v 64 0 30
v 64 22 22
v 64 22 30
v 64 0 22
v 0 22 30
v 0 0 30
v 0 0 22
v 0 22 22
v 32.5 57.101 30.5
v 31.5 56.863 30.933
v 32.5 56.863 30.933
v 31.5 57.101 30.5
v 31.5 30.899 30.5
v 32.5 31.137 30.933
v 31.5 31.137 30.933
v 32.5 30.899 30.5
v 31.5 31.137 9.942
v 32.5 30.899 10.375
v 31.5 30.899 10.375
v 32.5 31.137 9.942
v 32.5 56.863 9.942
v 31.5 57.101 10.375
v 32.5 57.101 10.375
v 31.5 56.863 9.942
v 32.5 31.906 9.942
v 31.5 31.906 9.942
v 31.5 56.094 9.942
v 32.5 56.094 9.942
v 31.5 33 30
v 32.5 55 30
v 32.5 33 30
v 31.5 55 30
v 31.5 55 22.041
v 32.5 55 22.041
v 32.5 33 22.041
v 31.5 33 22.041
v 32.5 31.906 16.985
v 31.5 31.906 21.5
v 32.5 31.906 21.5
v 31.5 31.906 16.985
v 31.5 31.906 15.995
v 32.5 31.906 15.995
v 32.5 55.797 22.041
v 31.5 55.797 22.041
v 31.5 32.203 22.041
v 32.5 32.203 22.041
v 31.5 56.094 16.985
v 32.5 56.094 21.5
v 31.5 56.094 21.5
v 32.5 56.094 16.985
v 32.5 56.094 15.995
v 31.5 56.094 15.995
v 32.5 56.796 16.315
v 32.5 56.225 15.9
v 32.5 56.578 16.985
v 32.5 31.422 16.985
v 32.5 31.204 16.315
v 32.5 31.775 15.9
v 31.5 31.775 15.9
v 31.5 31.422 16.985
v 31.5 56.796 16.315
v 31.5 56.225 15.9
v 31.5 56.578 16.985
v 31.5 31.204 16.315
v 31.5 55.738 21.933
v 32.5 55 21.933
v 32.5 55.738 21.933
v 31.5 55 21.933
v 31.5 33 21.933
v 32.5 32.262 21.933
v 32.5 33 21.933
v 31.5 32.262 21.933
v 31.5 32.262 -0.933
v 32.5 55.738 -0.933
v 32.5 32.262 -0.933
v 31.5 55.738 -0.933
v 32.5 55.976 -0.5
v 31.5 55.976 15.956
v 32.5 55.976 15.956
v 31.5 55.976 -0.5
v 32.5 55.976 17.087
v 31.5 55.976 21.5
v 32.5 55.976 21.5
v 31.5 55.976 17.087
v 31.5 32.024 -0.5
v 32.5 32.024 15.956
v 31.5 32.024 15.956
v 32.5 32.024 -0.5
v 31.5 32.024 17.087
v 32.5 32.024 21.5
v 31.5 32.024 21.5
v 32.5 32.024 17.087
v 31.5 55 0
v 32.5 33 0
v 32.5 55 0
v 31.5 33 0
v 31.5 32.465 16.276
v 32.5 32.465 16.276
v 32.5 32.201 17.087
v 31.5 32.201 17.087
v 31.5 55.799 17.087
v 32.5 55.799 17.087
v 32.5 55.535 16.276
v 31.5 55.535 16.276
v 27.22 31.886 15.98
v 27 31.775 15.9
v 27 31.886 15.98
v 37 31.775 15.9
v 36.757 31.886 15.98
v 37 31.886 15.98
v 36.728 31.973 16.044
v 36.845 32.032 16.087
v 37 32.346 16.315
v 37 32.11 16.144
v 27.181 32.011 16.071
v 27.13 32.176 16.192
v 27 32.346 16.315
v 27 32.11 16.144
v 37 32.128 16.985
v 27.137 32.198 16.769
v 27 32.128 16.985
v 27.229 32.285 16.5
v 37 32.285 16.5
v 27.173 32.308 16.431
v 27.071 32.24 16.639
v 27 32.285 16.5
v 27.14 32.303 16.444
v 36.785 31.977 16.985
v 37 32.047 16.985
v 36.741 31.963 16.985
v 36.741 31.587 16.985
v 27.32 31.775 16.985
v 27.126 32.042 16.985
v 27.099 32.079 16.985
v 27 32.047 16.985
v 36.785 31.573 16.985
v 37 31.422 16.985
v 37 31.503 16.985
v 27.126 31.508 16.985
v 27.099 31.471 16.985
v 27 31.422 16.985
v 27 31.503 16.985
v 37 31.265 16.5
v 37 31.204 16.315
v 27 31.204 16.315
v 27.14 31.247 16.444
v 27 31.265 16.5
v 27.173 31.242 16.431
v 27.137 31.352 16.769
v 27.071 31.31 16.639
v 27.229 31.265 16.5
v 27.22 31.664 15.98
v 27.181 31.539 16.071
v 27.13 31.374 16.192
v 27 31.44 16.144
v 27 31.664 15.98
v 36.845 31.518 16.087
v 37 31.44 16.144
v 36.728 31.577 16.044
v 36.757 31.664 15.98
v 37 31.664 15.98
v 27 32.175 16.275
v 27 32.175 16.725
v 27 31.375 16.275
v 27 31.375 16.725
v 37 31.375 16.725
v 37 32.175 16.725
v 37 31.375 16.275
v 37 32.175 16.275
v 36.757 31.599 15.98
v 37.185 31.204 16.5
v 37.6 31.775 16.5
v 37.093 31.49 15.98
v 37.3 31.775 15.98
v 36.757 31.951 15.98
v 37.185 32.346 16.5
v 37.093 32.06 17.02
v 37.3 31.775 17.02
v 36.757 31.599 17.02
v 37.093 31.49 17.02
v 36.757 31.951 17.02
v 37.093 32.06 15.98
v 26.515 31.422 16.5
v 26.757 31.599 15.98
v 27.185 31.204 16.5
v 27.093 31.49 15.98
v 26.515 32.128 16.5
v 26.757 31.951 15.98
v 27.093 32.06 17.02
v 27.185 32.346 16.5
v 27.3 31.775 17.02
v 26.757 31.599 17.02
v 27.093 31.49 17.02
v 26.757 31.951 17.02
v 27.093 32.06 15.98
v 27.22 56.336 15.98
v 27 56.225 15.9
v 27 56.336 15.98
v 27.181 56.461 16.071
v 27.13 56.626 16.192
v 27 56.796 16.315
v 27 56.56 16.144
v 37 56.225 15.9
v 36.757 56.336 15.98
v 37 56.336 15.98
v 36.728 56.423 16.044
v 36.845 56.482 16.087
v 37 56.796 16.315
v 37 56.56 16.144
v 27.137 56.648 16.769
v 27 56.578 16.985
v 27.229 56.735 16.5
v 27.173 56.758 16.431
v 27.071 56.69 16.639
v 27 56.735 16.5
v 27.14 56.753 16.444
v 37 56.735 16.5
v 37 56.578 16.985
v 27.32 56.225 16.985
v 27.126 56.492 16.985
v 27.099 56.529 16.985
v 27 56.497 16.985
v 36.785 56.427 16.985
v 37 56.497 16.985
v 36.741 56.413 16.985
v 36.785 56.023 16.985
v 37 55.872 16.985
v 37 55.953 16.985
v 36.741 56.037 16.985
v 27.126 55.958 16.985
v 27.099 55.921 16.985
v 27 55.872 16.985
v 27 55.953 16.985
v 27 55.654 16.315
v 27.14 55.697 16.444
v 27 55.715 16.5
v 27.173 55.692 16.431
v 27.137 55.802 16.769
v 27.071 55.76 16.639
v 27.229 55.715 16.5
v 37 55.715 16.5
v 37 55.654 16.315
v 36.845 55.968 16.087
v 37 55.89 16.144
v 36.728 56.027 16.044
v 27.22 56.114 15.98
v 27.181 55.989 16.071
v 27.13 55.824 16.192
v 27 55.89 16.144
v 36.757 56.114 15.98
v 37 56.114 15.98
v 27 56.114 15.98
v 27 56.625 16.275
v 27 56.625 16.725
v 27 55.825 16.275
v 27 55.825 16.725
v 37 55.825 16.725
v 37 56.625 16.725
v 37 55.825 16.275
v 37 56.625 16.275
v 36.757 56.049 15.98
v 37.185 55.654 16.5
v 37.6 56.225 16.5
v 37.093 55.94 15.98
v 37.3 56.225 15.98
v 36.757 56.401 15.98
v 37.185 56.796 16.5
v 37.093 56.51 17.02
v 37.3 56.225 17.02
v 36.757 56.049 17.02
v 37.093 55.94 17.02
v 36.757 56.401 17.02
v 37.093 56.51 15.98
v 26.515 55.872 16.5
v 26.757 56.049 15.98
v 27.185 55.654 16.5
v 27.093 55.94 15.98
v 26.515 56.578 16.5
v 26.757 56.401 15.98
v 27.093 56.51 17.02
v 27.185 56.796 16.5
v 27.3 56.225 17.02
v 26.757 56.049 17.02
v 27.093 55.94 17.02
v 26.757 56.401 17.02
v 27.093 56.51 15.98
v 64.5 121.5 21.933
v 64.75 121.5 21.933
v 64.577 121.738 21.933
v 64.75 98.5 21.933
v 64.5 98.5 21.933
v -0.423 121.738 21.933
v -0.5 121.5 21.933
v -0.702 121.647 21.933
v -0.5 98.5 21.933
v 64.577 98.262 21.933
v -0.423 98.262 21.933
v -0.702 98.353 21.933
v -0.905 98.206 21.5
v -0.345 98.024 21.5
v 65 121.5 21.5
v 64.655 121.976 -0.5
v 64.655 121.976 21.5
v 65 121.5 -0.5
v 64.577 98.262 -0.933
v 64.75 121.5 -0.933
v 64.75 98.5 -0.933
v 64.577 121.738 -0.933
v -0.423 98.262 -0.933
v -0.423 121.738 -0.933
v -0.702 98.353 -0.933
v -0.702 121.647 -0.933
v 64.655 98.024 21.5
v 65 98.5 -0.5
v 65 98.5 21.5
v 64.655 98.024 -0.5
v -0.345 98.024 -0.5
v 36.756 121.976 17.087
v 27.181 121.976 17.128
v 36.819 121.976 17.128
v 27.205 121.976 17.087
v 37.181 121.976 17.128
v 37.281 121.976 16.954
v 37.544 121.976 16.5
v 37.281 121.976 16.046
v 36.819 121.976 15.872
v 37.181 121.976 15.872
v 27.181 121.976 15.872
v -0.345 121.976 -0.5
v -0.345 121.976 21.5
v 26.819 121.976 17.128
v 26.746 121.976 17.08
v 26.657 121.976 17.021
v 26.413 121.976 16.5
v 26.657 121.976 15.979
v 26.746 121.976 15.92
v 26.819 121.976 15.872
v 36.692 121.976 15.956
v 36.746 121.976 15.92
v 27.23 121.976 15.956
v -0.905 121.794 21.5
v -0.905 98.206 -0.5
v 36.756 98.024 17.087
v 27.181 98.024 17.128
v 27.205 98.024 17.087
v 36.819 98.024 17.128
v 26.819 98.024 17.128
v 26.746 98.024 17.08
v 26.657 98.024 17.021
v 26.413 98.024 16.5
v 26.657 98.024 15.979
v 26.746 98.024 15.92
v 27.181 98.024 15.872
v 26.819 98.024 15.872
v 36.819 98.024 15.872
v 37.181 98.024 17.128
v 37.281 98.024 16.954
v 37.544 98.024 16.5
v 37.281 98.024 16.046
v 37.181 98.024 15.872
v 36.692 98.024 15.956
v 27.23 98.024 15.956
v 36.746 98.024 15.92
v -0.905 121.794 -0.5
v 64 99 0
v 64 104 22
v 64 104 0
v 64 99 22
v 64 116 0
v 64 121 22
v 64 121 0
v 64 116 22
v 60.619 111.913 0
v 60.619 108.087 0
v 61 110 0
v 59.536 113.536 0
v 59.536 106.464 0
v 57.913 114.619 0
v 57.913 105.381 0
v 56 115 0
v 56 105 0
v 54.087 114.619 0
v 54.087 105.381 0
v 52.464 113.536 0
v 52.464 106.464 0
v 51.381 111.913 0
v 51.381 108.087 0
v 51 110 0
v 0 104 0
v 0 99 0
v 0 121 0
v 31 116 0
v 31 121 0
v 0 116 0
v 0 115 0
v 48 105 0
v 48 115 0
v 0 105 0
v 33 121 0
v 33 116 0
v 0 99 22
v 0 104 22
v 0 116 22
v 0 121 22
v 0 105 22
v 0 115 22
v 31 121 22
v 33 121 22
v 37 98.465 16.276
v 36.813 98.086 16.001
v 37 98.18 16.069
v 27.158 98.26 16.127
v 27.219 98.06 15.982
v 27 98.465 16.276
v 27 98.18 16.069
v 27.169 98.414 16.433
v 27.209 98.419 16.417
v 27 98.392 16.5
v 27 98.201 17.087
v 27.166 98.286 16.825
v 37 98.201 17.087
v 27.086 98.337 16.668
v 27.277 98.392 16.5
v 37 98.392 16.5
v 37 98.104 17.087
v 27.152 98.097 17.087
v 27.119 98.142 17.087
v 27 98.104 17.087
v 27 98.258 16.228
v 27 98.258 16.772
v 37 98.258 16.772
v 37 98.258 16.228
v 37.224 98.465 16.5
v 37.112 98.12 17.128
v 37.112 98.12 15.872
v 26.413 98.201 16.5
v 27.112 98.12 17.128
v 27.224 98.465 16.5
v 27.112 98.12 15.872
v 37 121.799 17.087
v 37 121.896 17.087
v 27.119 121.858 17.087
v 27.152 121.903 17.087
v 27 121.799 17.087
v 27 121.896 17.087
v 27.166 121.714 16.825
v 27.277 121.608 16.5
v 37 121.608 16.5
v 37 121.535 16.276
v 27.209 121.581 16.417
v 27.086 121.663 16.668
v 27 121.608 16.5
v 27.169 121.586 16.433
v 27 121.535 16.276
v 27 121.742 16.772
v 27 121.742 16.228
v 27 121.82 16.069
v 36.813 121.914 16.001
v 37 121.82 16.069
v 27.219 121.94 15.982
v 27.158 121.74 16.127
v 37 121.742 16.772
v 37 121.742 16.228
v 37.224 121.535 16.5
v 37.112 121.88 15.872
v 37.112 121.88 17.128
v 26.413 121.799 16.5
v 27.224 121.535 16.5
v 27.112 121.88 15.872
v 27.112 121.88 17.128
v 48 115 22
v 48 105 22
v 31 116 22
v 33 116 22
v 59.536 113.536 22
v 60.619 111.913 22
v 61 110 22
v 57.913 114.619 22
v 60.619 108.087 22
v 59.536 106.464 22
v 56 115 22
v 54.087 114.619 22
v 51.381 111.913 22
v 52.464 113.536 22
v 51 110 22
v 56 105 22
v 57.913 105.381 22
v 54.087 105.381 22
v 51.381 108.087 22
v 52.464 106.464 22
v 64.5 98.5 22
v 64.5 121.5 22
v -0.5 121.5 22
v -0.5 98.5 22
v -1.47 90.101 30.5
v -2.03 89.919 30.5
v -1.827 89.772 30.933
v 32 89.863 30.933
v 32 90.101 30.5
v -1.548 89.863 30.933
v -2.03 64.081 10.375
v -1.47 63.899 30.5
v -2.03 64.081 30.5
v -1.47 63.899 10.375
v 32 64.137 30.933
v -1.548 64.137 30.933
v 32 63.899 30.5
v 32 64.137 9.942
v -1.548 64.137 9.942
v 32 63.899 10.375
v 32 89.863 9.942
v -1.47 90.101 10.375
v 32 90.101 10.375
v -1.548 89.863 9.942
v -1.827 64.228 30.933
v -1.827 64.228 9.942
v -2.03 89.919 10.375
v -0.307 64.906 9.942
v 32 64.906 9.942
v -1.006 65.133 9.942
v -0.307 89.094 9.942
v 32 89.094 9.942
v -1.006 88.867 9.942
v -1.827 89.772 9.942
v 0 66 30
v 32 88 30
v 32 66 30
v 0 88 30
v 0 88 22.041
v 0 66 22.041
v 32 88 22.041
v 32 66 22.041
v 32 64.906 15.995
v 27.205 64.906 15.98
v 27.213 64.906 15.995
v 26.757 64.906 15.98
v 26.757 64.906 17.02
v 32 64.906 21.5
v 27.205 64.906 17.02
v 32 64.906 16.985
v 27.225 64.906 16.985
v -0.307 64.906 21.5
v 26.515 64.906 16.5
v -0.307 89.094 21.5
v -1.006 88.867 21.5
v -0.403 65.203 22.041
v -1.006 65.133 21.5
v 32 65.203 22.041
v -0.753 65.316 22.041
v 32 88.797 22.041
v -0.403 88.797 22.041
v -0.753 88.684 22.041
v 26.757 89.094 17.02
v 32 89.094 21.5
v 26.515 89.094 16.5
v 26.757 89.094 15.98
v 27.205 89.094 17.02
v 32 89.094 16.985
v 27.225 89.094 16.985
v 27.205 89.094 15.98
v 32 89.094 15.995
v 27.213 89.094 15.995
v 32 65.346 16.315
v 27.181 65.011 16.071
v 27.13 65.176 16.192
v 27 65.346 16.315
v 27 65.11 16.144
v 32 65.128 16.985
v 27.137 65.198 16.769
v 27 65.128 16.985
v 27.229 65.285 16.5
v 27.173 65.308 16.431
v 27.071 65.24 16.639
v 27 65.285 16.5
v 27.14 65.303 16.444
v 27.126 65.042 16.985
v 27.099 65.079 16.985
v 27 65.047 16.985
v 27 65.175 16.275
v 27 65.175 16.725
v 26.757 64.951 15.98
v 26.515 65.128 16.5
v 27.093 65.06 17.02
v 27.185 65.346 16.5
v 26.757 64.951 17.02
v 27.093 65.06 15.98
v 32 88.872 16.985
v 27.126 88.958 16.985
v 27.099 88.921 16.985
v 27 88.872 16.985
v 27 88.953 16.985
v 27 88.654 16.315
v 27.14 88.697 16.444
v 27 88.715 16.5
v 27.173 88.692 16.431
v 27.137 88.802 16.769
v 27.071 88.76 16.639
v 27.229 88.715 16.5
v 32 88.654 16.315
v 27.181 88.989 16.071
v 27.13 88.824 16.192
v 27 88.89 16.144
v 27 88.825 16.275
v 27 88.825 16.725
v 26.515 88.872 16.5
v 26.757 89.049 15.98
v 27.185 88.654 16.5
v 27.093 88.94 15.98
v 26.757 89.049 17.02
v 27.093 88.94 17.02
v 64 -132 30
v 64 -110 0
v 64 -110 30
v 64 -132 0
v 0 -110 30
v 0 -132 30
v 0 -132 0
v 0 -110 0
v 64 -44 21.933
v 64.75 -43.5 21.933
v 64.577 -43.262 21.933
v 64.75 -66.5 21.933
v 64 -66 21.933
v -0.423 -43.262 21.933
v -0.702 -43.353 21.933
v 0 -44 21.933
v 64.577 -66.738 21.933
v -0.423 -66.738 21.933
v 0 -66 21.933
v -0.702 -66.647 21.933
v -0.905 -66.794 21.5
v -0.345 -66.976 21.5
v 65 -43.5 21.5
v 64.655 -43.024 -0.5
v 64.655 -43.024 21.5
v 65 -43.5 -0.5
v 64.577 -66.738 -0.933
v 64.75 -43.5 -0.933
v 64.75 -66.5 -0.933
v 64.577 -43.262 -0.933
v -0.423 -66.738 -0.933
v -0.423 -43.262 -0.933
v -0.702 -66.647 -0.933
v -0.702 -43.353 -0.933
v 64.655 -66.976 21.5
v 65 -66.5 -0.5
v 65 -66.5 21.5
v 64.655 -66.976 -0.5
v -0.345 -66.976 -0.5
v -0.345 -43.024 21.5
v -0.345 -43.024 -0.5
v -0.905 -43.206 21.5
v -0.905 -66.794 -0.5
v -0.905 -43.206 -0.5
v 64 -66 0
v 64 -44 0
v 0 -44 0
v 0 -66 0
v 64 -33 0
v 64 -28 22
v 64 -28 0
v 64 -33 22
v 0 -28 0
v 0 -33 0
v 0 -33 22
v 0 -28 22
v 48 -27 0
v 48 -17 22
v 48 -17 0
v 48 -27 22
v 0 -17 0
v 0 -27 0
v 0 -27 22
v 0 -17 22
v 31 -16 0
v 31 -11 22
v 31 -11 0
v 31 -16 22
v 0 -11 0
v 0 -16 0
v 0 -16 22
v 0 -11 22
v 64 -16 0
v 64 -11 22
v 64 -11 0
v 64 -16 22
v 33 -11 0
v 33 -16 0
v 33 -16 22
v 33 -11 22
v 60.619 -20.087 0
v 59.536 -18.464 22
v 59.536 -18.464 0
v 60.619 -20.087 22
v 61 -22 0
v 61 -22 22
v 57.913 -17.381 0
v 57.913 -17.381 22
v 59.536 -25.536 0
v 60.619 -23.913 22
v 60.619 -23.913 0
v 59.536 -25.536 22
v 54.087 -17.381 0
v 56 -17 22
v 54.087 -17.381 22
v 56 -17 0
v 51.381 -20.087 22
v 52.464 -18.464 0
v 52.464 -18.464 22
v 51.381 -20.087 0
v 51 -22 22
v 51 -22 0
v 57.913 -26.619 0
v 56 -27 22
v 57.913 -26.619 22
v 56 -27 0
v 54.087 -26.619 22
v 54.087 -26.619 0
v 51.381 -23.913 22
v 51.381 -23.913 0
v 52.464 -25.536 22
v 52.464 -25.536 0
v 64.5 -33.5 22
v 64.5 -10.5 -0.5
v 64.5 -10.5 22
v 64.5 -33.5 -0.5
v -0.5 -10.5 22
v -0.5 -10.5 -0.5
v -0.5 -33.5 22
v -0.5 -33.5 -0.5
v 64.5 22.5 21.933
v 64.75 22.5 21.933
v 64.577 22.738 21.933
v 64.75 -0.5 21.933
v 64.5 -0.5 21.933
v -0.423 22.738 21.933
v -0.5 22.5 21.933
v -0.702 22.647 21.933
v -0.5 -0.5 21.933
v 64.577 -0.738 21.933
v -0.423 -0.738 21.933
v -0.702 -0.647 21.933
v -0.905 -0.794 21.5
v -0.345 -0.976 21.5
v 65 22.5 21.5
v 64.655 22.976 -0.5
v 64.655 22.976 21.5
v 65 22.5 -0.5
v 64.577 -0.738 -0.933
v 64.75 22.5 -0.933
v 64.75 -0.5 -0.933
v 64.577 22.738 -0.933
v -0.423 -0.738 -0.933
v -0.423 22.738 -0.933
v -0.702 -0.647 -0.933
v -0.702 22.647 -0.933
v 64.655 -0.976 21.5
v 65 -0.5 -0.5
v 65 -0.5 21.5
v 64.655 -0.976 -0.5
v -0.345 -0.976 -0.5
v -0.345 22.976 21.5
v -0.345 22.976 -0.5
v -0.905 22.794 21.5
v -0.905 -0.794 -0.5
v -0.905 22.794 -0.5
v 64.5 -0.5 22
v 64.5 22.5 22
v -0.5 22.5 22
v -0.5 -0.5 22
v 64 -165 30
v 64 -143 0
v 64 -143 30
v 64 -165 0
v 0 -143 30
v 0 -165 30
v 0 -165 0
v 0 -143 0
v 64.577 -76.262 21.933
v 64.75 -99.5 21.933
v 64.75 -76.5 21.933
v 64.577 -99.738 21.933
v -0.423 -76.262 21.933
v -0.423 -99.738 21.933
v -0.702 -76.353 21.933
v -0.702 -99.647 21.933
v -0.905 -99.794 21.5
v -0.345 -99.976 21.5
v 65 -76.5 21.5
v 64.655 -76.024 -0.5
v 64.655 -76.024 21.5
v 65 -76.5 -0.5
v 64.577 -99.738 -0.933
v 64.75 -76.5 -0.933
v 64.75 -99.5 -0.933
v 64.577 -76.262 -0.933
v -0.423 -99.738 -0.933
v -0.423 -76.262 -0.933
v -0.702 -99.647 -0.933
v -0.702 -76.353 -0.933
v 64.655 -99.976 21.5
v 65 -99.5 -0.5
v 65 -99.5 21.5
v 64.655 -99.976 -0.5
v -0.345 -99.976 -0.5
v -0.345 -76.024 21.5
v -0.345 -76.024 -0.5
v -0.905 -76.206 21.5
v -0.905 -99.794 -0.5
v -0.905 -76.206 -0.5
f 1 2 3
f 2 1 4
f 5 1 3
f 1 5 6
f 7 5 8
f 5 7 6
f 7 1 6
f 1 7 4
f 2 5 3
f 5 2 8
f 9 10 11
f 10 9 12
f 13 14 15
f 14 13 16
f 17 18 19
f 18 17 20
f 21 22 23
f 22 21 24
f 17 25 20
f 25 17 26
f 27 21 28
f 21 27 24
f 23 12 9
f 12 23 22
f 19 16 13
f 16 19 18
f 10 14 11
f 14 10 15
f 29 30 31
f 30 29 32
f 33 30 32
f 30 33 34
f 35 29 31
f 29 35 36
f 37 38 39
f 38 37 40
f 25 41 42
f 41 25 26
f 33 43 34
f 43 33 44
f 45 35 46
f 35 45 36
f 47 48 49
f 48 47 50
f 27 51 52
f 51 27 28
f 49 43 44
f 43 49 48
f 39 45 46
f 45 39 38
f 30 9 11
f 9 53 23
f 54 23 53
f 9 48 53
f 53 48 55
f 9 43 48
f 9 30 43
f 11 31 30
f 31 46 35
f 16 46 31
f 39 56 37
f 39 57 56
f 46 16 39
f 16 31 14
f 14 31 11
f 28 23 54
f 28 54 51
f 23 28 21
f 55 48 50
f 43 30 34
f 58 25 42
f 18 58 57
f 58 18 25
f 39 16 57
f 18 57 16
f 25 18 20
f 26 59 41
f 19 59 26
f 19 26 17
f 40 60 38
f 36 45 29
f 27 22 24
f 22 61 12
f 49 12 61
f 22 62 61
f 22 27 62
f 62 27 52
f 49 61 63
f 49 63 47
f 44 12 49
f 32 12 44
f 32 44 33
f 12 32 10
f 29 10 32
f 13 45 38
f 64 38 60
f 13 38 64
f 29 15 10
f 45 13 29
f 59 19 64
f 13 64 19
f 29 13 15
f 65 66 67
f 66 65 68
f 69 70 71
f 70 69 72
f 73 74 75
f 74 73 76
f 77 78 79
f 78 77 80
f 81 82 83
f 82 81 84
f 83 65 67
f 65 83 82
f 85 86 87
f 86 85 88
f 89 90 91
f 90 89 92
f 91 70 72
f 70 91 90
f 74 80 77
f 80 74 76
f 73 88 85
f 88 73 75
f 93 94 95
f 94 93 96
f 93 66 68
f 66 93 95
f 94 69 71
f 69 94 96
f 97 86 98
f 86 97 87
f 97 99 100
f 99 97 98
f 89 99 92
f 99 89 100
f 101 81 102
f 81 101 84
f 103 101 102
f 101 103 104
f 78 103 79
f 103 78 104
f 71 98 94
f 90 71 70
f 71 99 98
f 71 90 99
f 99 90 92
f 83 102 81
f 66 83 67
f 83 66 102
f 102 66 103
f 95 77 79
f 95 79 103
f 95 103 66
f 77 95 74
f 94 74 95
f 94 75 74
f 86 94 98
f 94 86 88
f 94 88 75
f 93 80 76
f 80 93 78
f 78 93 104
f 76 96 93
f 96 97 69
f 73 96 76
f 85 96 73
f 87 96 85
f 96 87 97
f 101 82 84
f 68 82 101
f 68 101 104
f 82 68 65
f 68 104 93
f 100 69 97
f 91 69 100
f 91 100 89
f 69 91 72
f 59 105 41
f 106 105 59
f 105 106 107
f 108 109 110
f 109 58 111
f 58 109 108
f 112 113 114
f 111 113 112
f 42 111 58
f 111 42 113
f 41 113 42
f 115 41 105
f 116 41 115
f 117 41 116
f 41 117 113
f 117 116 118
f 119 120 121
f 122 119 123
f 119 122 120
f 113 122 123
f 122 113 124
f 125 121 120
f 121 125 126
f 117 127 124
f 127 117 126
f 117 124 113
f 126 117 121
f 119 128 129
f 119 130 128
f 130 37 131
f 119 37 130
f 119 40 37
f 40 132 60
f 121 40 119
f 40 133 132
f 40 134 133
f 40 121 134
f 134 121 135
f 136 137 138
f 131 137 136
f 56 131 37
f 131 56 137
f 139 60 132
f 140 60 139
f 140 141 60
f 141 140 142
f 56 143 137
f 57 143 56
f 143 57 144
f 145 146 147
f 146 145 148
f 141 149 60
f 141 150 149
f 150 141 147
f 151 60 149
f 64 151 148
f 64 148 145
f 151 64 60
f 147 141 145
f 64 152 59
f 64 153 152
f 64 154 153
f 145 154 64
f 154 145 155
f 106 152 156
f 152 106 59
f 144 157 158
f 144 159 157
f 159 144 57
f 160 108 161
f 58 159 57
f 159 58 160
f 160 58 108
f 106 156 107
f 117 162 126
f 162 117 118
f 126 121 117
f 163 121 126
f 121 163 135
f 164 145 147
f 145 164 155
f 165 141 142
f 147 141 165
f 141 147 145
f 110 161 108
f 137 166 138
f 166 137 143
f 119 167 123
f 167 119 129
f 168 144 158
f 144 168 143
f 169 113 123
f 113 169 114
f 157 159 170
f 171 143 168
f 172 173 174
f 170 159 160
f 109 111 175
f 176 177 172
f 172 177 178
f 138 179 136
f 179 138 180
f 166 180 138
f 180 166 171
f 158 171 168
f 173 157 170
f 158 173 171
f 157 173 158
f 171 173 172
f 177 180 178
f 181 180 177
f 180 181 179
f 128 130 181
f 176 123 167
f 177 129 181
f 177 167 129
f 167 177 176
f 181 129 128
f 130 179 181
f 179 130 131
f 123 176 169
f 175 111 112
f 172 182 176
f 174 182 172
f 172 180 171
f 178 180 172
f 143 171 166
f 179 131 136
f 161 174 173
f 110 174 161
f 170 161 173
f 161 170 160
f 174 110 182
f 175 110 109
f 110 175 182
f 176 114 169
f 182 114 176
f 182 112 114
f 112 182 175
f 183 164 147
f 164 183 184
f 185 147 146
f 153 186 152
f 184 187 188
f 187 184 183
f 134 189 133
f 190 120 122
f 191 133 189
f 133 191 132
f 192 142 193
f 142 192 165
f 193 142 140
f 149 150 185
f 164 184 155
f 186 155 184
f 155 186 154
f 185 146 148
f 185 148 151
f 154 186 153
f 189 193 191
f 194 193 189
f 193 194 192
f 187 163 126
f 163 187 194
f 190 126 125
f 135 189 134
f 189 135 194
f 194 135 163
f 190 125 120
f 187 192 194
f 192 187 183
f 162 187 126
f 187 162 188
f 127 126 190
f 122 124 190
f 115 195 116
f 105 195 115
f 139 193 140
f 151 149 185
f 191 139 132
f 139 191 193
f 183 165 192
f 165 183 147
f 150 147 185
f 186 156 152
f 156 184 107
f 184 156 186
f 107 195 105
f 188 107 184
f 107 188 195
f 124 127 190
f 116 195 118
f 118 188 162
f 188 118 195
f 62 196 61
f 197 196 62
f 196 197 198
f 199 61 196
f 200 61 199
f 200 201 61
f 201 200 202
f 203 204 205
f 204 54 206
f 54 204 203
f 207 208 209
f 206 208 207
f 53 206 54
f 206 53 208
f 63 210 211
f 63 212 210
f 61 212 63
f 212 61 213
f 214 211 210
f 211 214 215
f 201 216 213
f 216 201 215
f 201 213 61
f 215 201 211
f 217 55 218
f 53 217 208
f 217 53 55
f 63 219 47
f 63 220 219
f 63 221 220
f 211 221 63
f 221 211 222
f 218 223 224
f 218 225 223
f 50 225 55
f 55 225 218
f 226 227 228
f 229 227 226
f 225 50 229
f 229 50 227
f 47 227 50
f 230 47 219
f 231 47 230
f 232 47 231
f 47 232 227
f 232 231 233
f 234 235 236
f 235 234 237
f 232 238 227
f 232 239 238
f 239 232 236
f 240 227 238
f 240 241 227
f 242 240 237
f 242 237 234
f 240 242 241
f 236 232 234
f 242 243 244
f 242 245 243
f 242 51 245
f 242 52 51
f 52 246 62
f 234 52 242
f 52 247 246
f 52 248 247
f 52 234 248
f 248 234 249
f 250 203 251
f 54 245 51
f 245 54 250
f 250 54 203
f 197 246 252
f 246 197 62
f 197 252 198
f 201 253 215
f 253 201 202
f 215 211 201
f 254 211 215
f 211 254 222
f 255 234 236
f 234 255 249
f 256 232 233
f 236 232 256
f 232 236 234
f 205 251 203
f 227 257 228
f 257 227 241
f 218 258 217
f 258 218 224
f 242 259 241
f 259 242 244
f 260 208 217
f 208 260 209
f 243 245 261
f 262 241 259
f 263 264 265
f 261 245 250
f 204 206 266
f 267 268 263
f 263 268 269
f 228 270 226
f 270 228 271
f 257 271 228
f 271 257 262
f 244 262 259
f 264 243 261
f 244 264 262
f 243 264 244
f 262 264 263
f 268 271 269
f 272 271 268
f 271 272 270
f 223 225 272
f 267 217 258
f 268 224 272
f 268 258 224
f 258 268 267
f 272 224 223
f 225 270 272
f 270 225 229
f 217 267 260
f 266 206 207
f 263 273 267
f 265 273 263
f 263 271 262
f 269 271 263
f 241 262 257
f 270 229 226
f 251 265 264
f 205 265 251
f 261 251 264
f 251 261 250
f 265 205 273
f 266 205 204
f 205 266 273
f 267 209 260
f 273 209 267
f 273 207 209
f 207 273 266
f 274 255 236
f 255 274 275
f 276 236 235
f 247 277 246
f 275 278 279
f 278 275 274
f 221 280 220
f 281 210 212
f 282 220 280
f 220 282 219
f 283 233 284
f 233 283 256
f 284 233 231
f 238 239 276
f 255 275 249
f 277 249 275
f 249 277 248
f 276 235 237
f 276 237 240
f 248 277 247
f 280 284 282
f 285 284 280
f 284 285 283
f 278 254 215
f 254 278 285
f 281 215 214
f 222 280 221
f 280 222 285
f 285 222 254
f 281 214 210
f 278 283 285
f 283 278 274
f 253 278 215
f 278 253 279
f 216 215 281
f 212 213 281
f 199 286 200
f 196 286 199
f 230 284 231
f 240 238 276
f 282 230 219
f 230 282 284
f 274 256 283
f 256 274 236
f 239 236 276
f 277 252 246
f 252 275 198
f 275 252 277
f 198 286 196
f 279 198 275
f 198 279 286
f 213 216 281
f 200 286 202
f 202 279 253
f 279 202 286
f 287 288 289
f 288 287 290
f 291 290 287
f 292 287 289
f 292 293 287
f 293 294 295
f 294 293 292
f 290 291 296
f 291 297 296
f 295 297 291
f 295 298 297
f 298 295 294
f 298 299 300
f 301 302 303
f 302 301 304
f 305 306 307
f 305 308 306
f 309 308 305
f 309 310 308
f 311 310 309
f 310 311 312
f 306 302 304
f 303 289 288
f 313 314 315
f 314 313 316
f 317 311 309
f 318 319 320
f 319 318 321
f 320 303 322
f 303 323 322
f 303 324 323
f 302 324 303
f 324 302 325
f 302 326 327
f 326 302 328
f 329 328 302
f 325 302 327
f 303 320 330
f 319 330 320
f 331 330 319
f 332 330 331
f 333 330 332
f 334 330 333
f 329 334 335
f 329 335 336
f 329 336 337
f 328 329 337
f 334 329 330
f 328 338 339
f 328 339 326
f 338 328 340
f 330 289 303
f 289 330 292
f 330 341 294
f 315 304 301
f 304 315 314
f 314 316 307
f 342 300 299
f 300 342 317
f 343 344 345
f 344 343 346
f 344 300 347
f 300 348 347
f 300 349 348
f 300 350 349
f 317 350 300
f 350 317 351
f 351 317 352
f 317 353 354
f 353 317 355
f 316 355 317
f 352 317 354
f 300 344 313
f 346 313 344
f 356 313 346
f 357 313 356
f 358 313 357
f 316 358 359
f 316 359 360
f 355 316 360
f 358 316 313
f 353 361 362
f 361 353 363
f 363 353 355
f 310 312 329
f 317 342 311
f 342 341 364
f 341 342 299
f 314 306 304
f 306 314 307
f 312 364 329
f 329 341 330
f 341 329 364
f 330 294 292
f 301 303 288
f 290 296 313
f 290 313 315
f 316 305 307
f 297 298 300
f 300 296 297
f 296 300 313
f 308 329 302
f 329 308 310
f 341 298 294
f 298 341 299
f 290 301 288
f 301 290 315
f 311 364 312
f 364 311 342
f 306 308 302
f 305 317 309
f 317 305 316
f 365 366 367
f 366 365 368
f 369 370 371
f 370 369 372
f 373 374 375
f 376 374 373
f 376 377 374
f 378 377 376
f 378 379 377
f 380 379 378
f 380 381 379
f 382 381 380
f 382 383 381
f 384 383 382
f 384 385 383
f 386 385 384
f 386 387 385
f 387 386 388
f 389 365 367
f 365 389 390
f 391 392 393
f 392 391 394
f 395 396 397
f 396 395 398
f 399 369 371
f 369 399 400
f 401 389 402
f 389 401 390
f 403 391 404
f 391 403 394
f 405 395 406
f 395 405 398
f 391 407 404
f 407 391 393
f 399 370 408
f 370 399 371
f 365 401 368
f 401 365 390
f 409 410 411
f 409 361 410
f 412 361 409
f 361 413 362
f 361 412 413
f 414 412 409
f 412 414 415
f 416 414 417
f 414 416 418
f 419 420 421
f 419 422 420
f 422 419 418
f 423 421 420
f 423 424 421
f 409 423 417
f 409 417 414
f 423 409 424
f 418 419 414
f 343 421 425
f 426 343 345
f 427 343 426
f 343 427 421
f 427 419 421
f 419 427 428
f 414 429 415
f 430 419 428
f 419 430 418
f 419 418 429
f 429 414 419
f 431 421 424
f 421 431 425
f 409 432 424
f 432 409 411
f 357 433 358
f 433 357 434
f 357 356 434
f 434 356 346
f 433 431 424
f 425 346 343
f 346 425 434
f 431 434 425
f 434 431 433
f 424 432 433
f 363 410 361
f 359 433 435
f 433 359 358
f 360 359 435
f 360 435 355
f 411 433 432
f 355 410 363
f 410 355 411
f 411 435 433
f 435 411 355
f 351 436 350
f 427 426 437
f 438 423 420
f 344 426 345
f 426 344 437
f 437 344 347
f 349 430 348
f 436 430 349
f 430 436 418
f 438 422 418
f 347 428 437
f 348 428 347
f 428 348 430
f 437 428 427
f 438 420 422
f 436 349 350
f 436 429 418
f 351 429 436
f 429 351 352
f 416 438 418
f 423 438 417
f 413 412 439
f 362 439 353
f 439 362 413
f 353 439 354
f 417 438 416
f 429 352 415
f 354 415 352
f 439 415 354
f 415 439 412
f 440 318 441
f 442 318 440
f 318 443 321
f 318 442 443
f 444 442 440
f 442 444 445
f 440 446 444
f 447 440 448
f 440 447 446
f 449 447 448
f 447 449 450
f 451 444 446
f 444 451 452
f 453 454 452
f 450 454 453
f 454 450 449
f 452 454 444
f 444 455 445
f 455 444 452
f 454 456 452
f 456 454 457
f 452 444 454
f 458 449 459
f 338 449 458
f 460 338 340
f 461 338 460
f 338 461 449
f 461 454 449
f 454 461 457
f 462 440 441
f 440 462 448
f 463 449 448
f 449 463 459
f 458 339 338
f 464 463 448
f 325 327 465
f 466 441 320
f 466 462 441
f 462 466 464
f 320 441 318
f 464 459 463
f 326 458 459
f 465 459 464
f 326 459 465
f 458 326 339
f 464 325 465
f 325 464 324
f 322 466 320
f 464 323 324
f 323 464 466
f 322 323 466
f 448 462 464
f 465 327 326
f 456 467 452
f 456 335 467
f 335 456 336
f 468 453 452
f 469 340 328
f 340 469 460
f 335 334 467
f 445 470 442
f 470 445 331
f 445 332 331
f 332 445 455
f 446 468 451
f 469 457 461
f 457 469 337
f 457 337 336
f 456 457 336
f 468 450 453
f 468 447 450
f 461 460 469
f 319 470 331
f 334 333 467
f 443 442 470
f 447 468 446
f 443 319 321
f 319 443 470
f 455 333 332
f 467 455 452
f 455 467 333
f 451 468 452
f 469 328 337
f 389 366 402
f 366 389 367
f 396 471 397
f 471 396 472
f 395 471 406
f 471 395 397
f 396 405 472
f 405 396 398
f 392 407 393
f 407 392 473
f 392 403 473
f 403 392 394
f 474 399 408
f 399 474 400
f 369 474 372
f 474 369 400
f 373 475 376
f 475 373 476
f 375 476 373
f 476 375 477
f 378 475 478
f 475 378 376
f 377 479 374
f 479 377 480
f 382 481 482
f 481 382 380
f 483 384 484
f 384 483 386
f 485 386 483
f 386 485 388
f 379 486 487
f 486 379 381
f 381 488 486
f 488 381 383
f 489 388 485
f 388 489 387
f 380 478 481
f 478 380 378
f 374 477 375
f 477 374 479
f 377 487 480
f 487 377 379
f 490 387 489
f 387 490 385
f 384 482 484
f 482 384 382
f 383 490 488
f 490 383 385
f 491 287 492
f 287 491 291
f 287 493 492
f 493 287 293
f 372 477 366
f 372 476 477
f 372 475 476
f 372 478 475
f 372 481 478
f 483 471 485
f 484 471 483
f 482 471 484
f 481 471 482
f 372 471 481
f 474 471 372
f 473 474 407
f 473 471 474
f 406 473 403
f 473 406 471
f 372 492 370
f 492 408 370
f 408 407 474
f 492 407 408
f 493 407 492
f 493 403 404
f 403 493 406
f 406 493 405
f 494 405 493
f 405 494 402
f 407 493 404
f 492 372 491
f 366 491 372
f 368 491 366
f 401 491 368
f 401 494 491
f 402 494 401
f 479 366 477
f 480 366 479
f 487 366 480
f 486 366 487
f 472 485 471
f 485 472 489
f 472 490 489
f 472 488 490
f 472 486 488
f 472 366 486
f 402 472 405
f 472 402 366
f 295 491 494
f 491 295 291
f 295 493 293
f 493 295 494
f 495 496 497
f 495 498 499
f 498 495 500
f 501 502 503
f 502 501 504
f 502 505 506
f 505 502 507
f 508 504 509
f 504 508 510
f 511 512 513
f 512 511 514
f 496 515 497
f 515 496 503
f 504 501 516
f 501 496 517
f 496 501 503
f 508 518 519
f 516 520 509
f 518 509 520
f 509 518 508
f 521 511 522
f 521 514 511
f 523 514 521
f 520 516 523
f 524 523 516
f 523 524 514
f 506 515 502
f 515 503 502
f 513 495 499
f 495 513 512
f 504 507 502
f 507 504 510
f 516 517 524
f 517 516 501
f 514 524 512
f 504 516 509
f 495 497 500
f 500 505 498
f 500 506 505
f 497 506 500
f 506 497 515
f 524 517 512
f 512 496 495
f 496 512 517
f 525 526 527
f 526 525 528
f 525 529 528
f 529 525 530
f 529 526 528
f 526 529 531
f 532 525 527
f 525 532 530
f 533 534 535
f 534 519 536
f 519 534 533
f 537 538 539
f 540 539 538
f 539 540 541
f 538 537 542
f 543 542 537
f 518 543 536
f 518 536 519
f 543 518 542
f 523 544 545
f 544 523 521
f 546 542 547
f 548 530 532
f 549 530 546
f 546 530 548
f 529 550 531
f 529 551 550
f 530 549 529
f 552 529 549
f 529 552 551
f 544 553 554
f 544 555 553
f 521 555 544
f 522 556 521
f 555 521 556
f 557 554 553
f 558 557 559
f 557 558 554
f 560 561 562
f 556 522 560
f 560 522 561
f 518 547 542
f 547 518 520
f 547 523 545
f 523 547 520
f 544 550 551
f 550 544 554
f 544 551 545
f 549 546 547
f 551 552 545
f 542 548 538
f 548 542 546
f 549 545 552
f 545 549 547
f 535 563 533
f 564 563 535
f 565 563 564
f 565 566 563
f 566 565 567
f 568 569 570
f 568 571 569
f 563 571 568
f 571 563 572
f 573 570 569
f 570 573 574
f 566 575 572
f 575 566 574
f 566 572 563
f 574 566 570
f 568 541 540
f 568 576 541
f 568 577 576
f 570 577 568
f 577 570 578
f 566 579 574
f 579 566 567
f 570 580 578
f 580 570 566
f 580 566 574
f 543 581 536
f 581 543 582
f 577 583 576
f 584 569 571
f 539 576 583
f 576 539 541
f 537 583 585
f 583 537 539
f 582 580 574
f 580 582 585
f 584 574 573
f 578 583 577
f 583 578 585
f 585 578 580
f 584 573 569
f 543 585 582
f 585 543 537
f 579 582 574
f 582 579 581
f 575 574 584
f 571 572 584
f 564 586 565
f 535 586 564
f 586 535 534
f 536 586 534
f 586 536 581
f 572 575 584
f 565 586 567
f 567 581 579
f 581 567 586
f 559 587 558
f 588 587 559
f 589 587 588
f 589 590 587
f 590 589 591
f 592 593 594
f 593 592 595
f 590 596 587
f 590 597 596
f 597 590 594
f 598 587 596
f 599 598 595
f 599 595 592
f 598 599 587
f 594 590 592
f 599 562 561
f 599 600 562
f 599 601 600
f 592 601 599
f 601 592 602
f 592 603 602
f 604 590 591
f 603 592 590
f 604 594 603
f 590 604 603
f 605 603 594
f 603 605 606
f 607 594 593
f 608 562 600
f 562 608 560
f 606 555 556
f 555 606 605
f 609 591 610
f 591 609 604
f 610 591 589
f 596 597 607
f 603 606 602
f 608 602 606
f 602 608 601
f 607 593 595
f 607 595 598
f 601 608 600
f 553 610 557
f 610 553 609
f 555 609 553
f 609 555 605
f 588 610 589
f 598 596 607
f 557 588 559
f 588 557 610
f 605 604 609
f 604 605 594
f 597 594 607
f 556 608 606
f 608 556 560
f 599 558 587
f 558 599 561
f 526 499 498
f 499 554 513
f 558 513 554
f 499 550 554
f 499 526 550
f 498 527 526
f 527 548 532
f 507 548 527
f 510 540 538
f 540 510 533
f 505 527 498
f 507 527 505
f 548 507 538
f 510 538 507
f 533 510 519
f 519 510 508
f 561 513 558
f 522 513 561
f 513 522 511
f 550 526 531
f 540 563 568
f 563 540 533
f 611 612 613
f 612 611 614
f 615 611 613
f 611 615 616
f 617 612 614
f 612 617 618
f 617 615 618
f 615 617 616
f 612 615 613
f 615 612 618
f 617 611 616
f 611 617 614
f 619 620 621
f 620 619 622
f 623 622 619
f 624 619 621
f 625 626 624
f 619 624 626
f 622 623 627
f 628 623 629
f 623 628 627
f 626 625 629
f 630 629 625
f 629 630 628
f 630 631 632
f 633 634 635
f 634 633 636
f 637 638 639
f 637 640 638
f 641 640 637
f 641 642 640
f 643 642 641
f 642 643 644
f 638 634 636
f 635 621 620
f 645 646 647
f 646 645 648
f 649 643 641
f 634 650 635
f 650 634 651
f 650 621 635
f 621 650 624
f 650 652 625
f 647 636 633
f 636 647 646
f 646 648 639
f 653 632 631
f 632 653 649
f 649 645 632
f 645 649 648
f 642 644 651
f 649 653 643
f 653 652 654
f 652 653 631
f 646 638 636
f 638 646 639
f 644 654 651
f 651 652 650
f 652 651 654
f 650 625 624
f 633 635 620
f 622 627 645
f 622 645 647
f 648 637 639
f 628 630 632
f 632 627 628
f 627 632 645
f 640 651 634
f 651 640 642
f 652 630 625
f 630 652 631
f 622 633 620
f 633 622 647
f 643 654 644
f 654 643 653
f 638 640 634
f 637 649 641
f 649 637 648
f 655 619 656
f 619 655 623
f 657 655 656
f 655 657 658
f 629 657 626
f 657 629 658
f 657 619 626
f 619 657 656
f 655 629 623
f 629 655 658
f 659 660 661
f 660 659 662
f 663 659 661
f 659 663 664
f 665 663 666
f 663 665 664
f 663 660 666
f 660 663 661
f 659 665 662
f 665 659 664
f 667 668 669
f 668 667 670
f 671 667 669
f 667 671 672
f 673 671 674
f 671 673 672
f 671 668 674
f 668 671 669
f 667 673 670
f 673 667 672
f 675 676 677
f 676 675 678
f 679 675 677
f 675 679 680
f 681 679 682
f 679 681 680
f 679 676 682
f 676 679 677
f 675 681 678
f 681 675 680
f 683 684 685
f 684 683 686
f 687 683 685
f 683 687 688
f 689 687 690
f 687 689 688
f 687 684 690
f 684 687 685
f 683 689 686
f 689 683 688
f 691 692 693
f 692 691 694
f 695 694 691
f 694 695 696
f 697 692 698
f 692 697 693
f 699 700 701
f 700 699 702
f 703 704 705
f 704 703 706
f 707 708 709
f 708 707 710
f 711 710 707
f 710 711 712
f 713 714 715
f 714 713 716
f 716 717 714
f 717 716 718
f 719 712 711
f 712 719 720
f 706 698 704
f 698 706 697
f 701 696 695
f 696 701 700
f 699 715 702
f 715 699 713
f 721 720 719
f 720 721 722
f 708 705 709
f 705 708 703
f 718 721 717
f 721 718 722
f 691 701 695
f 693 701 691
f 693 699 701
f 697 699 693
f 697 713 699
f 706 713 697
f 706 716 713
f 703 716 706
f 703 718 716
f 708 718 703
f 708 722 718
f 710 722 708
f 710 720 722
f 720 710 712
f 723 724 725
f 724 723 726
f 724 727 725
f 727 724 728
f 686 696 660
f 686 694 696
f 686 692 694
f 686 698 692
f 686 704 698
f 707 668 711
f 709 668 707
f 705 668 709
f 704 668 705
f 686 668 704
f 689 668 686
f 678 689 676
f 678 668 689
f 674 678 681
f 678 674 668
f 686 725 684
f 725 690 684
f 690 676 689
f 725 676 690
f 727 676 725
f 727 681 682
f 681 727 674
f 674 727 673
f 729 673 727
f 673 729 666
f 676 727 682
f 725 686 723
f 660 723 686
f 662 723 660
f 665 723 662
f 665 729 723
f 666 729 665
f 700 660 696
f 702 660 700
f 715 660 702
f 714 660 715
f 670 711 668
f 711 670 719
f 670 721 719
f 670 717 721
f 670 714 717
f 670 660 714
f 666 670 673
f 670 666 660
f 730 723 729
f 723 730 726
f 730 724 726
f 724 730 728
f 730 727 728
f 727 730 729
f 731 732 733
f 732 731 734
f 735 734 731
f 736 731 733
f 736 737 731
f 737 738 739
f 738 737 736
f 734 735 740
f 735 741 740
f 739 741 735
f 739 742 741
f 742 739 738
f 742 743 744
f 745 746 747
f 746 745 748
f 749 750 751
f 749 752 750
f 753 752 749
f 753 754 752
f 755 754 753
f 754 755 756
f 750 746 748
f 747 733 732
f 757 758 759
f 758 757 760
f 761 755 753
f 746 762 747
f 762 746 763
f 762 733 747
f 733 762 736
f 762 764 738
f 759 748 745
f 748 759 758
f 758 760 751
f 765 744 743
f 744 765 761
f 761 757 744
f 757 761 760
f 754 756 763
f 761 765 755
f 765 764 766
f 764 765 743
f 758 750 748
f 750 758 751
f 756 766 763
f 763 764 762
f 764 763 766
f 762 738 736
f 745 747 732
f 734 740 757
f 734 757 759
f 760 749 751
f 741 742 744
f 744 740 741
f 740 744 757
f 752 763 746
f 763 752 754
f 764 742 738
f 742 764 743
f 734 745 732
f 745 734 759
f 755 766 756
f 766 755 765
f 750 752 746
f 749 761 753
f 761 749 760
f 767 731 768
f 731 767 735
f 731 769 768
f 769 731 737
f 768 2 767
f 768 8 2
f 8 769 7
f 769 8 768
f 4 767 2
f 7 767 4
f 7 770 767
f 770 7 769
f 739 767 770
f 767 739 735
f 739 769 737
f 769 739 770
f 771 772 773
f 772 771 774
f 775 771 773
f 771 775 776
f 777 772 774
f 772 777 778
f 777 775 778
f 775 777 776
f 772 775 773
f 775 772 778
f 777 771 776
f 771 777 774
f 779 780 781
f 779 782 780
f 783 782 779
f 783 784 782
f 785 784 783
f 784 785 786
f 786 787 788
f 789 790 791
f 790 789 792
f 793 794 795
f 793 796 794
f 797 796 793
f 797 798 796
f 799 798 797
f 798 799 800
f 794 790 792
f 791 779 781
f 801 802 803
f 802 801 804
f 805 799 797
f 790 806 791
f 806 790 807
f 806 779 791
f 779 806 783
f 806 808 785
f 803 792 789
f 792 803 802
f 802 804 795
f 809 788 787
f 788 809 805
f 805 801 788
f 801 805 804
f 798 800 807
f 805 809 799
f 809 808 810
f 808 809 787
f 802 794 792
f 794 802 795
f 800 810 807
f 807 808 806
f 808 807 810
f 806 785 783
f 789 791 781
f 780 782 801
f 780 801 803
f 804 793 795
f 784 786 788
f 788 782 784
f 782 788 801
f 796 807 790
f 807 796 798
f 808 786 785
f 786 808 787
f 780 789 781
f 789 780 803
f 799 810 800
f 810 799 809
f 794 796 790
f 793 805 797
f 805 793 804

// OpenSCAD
// file: 05_locker.scad
include <00_main.scad>;

use <03_first_shell.scad>;
use <04_second_shell.scad>;


module _pill_core_locker(offset=0) {
    rotate([0,90,0])
    cylinder(h=locker_x, r=locker_r+offset, center=true);
}

module 05_pill_locker(offset=0) {    
    _pill_core_locker(offset);
    
    translate([locker_x/2,0,0])
    sphere(r=locker_r+offset);
    
    translate([-locker_x/2,0,0])
    sphere(r=locker_r+offset);
}


module 05_pill_locker_mid_position(with_offset=false) {
    mid_overlay = size_z * (1 - top_overlay + (top_overlay - top_part)/2);
    offset_val = with_offset ? second_shell_offset : 0;
    shift_y = second_shell_offset + size_wall + locker_y;

    translate([
        size_x/2,
        -shift_y,
        mid_overlay])
    05_pill_locker(offset=offset_val);
    
    translate([
        size_x/2,
        size_y + shift_y,
        mid_overlay])
    05_pill_locker(offset=offset_val);
}


// DEVELOPING ################################

module 05_slide_with_locker() {
    size_debug = size_wall * 10;
    alpha_debug = 0.5;

    intersection() {
        04_second_shell();
        01_debug_slice();
    }

    intersection() {
        difference() {
            03_first_shell();
            05_pill_locker_mid_position(with_offset=true);
        }
        01_debug_slice();
    }

    intersection() {
        translate([0,0,0]);
        05_pill_locker();
        01_debug_slice();
    }

    05_pill_locker_mid_position();
}

module 05_developing() {
    debug_shift = 10;
    steps = 4;  // decrease step number for better understanding

    translate([0, - (steps - 0) * (debug_shift * 1.5), 0]) {
        _pill_core_locker();
    }

    translate([0, - (steps - 1) * (debug_shift * 1.5), 0]) {
        05_pill_locker();
    }

    translate([0, - (steps - 2) * (debug_shift * 1.5), 0]) {
        05_pill_locker(offset=0.1);
    }

    translate([0, - (steps - 3) * (debug_shift * 1.5), 0]) {
        tmp = 0.1;
        
        difference() {
            #cube([6,2,2]);
            05_pill_locker(offset=tmp);
        }
        
        intersection() {
            cube([6,2,2]);
            05_pill_locker();
        }
    }

    translate([0, - (steps - 4) * (debug_shift * 1.5), 0]) {
        05_slide_with_locker();
    }

}

// Do not forget put all structures under a comment in 00_main.scad
05_developing();
// file: 04_second_shell.scad
include <00_main.scad>;
use <03_first_shell.scad>;

// next line is a debug_line - uncomment to use
// second_shell_cutted_top = false; //rewrite var from 00_main


module _secord_core_shell() {
    if (second_shell_cutted_top) {
        difference() {
            translate([0,0,size_z*(1-top_overlay)])
            scale([1,1,top_overlay])
            01_min_vol();

            translate([
                -size_x/4,
                -size_y/4,
                size_z - second_shell_offset - size_wall
            ])
            scale([1.5, 1.5, 1])
            01_min_vol();
        }
    } else {
        translate([0,0,size_z*(1-top_overlay)])
        scale([1,1,top_overlay])
        01_min_vol();
    }
}

module _secord_core_offset_shell() {
    minkowski() {
       _secord_core_shell();
       cube(second_shell_offset*2, center = true); 
    }
}

module _second_solid_shell() {
    minkowski() {
        _secord_core_offset_shell();
        cube(size_wall*3, center = true);
        sphere(d=size_wall);
    }
}

module _second_pre_shell() {
    difference() {
        _second_solid_shell();
        01_min_vol();
    }
}

module 04_second_shell() {
    difference() {
        _second_pre_shell();
        03_first_solid_shell(second_shell_offset);
    }
}

module 04_slide() {
    size_debug = size_wall * 10;
    alpha_debug = 0.5;

    intersection() {
        04_second_shell();
        01_debug_slice();
    }

    intersection() {
        03_first_shell();
        01_debug_slice();
    }

    // RED - first shell
    translate([size_x/2,0,size_z])
    color([1,0,0,alpha_debug])
    cube([size_debug,size_debug,size_wall]);

    if (!second_shell_cutted_top) {
        // GREEN - second_shell_offset
        translate([size_x/2+size_wall,-size_wall,size_z+size_wall])
        color([0,1,0,alpha_debug])
        cube([size_debug,size_debug,second_shell_offset]);

        // BLUE - second shell
        translate([size_x/2+size_wall*2,-size_wall*2,size_z+size_wall+second_shell_offset])
        color([0,0,1,alpha_debug])
        cube([size_debug,size_debug,size_wall]);
    }
}

// DEVELOPING ################################

module 04_developing() {
    steps = 6;  // decrease step number for better understanding

    translate([0, - (steps - 0) * (size_y * 1.5), 0]) {
        #01_min_vol();
    }

    translate([0, - (steps - 1) * (size_y * 1.5), 0]) {
        _secord_core_shell();
        #01_min_vol();
    }

    translate([0, - (steps - 2) * (size_y * 1.5), 0]) {
        _secord_core_offset_shell();
        #01_min_vol();
    }

    translate([0, - (steps - 3) * (size_y * 1.5), 0]) {
        _second_solid_shell();
    }

    translate([0, - (steps - 4) * (size_y * 1.5), 0]) {
        _second_pre_shell();
    }

    translate([0, - (steps - 5) * (size_y * 1.5), 0]) {
        04_second_shell();
    }

    translate([0, - (steps - 6) * (size_y * 1.5), 0]) {
        04_slide();   
    }
}

// Do not forget put all structures under a comment in 00_main.scad
04_developing();
// file: 06_assembling.scad
include <00_main.scad>;

use <02_internal_walls.scad>
use <03_first_shell.scad>;
use <04_second_shell.scad>;
use <05_locker.scad>;

module 05_first_final_shell() {
    if (with_locker) {
        difference() {
            03_first_shell();
            05_pill_locker_mid_position(with_offset=true);
        }
    }
    else {
        03_first_shell();
    }
    02_internal_walls();
}

module 05_second_final_shell() {
    04_second_shell();
    if (with_locker) {
        05_pill_locker_mid_position(with_offset=false);
    }
}

module 05_preview() {
    00_initial_forms(); #01_min_vol();

    translate([0, size_y * 1.5, 0])
    if (with_locker) {
        05_slide_with_locker();
    } else {
        04_slide();
    }

    translate([0, size_y * 4.5, 0])
    05_first_final_shell();

    translate([0, size_y * 3, 0])
    intersection(){
        05_second_final_shell();
        cube([size_x,size_y*3,size_z*3], center=true);
    }
}


// DEVELOPING ################################

module 05_developing() {    
    05_first_final_shell();

    mirror([0, 0, 1])
    translate([0,size_y*1.5,-size_z])
    05_second_final_shell();
}

// Do not forget put all structures under a comment in 00_main.scad
05_developing();
// file: 02_internal_walls.scad
include <00_main.scad>;
use <01_shared.scad>;


module _min_vol_n_half_wall() {
    minkowski() {
        union() {
            01_min_bottom_vol();
            translate([0,0,size_wall/2])
            01_min_bottom_vol();
        }
        cube(size_wall, center = true);
    }
}

module 02_internal_walls() {
    difference() {
        _min_vol_n_half_wall();
        00_initial_forms();
    }
}


// DEVELOPING ################################

module 02_developing() {
    steps = 3;  // decrease step number for better understanding

    translate([0, - (steps - 0) * (size_y * 1.5), 0]) {
        00_initial_forms();
        #01_min_vol();
    }

    translate([0, - (steps - 1) * (size_y * 1.5), 0]) {
        01_min_bottom_vol();
    }

    translate([0, - (steps - 2) * (size_y * 1.5), 0]) {
        _min_vol_n_half_wall();
    }

    translate([0, - (steps - 3) * (size_y * 1.5), 0]) {
        02_internal_walls();
    }
}

// Do not forget put all structures under a comment in 00_main.scad
02_developing();
// file: 01_shared.scad
include <00_main.scad>;


module 01_min_vol() {
    cube([size_x,size_y,size_z]);
}

module 01_min_bottom_vol() {
    scale([1,1,1 - top_part])
    01_min_vol();
}

module 01_debug_slice() {
    translate([size_x/2,-size_wall*3,-size_wall*3])
    cube([size_wall, size_y*3, size_z*3], center = true);
}
// file: 00_main.scad
use <01_shared.scad>;
use <06_assembling.scad>;


// PART_0 ################################

module 00_initial_forms() {
translate([0,0,0]) 
cube([64,5,30]);

translate([0,6,0])
cube([48,10,30]);

translate([0,17,0])
cube([31,5,30]);

translate([31 + 2,17,0])
cube([31,5,30]);
    
translate([56,11,0])
cylinder(30, r=5);
}


//00_initial_forms();


// PART_1 ################################

size_x = 64;
size_y = 22; 
size_z = 30;


//00_initial_forms(); #01_min_vol();


// PART_2 ################################

size_wall = 1;
second_shell_offset = 0.125;

top_part = 0.3;
top_overlay = 0.6;
second_shell_cutted_top = true;

with_locker = true;
locker_x = 10;
locker_r = 0.6;
locker_y = 0.1;


05_preview();


// PART_3 ################################

//$fn=60; 05_first_final_shell();
//$fn=60; 05_second_final_shell();
// main file
include <00_main.scad>;
use <01_shared.scad>;
use <02_internal_walls.scad>;


module 03_first_solid_shell(second_shell_offset=0) {
    minkowski() {
        01_min_bottom_vol();
        cube(size_wall, center = true);
        sphere(d=size_wall+second_shell_offset*2);
    }
}

module 03_first_shell() {
    difference(){
        03_first_solid_shell();
        01_min_vol();
    }
}


// DEVELOPING ################################

module 03_developing() {
    steps = 5;  // decrease step number for better understanding

    translate([0, - (steps - 0) * (size_y * 1.5), 0]) {
        #01_min_vol();
    }

    translate([0, - (steps - 1) * (size_y * 1.5), 0]) {
        #01_min_vol();
        01_min_bottom_vol();
    }

    translate([0, - (steps - 2) * (size_y * 1.5), 0]) {
        03_first_solid_shell();
    }

    translate([0, - (steps - 3) * (size_y * 1.5), 0]) {
        03_first_shell();
    }

    translate([0, - (steps - 4) * (size_y * 1.5), 0]) {
        02_internal_walls();
    }

    translate([0, - (steps - 5) * (size_y * 1.5), 0]) {
        union() {
            03_first_shell();
            02_internal_walls();
        }
    }
}

// Do not forget put all structures under a comment in 00_main.scad
03_developing();
